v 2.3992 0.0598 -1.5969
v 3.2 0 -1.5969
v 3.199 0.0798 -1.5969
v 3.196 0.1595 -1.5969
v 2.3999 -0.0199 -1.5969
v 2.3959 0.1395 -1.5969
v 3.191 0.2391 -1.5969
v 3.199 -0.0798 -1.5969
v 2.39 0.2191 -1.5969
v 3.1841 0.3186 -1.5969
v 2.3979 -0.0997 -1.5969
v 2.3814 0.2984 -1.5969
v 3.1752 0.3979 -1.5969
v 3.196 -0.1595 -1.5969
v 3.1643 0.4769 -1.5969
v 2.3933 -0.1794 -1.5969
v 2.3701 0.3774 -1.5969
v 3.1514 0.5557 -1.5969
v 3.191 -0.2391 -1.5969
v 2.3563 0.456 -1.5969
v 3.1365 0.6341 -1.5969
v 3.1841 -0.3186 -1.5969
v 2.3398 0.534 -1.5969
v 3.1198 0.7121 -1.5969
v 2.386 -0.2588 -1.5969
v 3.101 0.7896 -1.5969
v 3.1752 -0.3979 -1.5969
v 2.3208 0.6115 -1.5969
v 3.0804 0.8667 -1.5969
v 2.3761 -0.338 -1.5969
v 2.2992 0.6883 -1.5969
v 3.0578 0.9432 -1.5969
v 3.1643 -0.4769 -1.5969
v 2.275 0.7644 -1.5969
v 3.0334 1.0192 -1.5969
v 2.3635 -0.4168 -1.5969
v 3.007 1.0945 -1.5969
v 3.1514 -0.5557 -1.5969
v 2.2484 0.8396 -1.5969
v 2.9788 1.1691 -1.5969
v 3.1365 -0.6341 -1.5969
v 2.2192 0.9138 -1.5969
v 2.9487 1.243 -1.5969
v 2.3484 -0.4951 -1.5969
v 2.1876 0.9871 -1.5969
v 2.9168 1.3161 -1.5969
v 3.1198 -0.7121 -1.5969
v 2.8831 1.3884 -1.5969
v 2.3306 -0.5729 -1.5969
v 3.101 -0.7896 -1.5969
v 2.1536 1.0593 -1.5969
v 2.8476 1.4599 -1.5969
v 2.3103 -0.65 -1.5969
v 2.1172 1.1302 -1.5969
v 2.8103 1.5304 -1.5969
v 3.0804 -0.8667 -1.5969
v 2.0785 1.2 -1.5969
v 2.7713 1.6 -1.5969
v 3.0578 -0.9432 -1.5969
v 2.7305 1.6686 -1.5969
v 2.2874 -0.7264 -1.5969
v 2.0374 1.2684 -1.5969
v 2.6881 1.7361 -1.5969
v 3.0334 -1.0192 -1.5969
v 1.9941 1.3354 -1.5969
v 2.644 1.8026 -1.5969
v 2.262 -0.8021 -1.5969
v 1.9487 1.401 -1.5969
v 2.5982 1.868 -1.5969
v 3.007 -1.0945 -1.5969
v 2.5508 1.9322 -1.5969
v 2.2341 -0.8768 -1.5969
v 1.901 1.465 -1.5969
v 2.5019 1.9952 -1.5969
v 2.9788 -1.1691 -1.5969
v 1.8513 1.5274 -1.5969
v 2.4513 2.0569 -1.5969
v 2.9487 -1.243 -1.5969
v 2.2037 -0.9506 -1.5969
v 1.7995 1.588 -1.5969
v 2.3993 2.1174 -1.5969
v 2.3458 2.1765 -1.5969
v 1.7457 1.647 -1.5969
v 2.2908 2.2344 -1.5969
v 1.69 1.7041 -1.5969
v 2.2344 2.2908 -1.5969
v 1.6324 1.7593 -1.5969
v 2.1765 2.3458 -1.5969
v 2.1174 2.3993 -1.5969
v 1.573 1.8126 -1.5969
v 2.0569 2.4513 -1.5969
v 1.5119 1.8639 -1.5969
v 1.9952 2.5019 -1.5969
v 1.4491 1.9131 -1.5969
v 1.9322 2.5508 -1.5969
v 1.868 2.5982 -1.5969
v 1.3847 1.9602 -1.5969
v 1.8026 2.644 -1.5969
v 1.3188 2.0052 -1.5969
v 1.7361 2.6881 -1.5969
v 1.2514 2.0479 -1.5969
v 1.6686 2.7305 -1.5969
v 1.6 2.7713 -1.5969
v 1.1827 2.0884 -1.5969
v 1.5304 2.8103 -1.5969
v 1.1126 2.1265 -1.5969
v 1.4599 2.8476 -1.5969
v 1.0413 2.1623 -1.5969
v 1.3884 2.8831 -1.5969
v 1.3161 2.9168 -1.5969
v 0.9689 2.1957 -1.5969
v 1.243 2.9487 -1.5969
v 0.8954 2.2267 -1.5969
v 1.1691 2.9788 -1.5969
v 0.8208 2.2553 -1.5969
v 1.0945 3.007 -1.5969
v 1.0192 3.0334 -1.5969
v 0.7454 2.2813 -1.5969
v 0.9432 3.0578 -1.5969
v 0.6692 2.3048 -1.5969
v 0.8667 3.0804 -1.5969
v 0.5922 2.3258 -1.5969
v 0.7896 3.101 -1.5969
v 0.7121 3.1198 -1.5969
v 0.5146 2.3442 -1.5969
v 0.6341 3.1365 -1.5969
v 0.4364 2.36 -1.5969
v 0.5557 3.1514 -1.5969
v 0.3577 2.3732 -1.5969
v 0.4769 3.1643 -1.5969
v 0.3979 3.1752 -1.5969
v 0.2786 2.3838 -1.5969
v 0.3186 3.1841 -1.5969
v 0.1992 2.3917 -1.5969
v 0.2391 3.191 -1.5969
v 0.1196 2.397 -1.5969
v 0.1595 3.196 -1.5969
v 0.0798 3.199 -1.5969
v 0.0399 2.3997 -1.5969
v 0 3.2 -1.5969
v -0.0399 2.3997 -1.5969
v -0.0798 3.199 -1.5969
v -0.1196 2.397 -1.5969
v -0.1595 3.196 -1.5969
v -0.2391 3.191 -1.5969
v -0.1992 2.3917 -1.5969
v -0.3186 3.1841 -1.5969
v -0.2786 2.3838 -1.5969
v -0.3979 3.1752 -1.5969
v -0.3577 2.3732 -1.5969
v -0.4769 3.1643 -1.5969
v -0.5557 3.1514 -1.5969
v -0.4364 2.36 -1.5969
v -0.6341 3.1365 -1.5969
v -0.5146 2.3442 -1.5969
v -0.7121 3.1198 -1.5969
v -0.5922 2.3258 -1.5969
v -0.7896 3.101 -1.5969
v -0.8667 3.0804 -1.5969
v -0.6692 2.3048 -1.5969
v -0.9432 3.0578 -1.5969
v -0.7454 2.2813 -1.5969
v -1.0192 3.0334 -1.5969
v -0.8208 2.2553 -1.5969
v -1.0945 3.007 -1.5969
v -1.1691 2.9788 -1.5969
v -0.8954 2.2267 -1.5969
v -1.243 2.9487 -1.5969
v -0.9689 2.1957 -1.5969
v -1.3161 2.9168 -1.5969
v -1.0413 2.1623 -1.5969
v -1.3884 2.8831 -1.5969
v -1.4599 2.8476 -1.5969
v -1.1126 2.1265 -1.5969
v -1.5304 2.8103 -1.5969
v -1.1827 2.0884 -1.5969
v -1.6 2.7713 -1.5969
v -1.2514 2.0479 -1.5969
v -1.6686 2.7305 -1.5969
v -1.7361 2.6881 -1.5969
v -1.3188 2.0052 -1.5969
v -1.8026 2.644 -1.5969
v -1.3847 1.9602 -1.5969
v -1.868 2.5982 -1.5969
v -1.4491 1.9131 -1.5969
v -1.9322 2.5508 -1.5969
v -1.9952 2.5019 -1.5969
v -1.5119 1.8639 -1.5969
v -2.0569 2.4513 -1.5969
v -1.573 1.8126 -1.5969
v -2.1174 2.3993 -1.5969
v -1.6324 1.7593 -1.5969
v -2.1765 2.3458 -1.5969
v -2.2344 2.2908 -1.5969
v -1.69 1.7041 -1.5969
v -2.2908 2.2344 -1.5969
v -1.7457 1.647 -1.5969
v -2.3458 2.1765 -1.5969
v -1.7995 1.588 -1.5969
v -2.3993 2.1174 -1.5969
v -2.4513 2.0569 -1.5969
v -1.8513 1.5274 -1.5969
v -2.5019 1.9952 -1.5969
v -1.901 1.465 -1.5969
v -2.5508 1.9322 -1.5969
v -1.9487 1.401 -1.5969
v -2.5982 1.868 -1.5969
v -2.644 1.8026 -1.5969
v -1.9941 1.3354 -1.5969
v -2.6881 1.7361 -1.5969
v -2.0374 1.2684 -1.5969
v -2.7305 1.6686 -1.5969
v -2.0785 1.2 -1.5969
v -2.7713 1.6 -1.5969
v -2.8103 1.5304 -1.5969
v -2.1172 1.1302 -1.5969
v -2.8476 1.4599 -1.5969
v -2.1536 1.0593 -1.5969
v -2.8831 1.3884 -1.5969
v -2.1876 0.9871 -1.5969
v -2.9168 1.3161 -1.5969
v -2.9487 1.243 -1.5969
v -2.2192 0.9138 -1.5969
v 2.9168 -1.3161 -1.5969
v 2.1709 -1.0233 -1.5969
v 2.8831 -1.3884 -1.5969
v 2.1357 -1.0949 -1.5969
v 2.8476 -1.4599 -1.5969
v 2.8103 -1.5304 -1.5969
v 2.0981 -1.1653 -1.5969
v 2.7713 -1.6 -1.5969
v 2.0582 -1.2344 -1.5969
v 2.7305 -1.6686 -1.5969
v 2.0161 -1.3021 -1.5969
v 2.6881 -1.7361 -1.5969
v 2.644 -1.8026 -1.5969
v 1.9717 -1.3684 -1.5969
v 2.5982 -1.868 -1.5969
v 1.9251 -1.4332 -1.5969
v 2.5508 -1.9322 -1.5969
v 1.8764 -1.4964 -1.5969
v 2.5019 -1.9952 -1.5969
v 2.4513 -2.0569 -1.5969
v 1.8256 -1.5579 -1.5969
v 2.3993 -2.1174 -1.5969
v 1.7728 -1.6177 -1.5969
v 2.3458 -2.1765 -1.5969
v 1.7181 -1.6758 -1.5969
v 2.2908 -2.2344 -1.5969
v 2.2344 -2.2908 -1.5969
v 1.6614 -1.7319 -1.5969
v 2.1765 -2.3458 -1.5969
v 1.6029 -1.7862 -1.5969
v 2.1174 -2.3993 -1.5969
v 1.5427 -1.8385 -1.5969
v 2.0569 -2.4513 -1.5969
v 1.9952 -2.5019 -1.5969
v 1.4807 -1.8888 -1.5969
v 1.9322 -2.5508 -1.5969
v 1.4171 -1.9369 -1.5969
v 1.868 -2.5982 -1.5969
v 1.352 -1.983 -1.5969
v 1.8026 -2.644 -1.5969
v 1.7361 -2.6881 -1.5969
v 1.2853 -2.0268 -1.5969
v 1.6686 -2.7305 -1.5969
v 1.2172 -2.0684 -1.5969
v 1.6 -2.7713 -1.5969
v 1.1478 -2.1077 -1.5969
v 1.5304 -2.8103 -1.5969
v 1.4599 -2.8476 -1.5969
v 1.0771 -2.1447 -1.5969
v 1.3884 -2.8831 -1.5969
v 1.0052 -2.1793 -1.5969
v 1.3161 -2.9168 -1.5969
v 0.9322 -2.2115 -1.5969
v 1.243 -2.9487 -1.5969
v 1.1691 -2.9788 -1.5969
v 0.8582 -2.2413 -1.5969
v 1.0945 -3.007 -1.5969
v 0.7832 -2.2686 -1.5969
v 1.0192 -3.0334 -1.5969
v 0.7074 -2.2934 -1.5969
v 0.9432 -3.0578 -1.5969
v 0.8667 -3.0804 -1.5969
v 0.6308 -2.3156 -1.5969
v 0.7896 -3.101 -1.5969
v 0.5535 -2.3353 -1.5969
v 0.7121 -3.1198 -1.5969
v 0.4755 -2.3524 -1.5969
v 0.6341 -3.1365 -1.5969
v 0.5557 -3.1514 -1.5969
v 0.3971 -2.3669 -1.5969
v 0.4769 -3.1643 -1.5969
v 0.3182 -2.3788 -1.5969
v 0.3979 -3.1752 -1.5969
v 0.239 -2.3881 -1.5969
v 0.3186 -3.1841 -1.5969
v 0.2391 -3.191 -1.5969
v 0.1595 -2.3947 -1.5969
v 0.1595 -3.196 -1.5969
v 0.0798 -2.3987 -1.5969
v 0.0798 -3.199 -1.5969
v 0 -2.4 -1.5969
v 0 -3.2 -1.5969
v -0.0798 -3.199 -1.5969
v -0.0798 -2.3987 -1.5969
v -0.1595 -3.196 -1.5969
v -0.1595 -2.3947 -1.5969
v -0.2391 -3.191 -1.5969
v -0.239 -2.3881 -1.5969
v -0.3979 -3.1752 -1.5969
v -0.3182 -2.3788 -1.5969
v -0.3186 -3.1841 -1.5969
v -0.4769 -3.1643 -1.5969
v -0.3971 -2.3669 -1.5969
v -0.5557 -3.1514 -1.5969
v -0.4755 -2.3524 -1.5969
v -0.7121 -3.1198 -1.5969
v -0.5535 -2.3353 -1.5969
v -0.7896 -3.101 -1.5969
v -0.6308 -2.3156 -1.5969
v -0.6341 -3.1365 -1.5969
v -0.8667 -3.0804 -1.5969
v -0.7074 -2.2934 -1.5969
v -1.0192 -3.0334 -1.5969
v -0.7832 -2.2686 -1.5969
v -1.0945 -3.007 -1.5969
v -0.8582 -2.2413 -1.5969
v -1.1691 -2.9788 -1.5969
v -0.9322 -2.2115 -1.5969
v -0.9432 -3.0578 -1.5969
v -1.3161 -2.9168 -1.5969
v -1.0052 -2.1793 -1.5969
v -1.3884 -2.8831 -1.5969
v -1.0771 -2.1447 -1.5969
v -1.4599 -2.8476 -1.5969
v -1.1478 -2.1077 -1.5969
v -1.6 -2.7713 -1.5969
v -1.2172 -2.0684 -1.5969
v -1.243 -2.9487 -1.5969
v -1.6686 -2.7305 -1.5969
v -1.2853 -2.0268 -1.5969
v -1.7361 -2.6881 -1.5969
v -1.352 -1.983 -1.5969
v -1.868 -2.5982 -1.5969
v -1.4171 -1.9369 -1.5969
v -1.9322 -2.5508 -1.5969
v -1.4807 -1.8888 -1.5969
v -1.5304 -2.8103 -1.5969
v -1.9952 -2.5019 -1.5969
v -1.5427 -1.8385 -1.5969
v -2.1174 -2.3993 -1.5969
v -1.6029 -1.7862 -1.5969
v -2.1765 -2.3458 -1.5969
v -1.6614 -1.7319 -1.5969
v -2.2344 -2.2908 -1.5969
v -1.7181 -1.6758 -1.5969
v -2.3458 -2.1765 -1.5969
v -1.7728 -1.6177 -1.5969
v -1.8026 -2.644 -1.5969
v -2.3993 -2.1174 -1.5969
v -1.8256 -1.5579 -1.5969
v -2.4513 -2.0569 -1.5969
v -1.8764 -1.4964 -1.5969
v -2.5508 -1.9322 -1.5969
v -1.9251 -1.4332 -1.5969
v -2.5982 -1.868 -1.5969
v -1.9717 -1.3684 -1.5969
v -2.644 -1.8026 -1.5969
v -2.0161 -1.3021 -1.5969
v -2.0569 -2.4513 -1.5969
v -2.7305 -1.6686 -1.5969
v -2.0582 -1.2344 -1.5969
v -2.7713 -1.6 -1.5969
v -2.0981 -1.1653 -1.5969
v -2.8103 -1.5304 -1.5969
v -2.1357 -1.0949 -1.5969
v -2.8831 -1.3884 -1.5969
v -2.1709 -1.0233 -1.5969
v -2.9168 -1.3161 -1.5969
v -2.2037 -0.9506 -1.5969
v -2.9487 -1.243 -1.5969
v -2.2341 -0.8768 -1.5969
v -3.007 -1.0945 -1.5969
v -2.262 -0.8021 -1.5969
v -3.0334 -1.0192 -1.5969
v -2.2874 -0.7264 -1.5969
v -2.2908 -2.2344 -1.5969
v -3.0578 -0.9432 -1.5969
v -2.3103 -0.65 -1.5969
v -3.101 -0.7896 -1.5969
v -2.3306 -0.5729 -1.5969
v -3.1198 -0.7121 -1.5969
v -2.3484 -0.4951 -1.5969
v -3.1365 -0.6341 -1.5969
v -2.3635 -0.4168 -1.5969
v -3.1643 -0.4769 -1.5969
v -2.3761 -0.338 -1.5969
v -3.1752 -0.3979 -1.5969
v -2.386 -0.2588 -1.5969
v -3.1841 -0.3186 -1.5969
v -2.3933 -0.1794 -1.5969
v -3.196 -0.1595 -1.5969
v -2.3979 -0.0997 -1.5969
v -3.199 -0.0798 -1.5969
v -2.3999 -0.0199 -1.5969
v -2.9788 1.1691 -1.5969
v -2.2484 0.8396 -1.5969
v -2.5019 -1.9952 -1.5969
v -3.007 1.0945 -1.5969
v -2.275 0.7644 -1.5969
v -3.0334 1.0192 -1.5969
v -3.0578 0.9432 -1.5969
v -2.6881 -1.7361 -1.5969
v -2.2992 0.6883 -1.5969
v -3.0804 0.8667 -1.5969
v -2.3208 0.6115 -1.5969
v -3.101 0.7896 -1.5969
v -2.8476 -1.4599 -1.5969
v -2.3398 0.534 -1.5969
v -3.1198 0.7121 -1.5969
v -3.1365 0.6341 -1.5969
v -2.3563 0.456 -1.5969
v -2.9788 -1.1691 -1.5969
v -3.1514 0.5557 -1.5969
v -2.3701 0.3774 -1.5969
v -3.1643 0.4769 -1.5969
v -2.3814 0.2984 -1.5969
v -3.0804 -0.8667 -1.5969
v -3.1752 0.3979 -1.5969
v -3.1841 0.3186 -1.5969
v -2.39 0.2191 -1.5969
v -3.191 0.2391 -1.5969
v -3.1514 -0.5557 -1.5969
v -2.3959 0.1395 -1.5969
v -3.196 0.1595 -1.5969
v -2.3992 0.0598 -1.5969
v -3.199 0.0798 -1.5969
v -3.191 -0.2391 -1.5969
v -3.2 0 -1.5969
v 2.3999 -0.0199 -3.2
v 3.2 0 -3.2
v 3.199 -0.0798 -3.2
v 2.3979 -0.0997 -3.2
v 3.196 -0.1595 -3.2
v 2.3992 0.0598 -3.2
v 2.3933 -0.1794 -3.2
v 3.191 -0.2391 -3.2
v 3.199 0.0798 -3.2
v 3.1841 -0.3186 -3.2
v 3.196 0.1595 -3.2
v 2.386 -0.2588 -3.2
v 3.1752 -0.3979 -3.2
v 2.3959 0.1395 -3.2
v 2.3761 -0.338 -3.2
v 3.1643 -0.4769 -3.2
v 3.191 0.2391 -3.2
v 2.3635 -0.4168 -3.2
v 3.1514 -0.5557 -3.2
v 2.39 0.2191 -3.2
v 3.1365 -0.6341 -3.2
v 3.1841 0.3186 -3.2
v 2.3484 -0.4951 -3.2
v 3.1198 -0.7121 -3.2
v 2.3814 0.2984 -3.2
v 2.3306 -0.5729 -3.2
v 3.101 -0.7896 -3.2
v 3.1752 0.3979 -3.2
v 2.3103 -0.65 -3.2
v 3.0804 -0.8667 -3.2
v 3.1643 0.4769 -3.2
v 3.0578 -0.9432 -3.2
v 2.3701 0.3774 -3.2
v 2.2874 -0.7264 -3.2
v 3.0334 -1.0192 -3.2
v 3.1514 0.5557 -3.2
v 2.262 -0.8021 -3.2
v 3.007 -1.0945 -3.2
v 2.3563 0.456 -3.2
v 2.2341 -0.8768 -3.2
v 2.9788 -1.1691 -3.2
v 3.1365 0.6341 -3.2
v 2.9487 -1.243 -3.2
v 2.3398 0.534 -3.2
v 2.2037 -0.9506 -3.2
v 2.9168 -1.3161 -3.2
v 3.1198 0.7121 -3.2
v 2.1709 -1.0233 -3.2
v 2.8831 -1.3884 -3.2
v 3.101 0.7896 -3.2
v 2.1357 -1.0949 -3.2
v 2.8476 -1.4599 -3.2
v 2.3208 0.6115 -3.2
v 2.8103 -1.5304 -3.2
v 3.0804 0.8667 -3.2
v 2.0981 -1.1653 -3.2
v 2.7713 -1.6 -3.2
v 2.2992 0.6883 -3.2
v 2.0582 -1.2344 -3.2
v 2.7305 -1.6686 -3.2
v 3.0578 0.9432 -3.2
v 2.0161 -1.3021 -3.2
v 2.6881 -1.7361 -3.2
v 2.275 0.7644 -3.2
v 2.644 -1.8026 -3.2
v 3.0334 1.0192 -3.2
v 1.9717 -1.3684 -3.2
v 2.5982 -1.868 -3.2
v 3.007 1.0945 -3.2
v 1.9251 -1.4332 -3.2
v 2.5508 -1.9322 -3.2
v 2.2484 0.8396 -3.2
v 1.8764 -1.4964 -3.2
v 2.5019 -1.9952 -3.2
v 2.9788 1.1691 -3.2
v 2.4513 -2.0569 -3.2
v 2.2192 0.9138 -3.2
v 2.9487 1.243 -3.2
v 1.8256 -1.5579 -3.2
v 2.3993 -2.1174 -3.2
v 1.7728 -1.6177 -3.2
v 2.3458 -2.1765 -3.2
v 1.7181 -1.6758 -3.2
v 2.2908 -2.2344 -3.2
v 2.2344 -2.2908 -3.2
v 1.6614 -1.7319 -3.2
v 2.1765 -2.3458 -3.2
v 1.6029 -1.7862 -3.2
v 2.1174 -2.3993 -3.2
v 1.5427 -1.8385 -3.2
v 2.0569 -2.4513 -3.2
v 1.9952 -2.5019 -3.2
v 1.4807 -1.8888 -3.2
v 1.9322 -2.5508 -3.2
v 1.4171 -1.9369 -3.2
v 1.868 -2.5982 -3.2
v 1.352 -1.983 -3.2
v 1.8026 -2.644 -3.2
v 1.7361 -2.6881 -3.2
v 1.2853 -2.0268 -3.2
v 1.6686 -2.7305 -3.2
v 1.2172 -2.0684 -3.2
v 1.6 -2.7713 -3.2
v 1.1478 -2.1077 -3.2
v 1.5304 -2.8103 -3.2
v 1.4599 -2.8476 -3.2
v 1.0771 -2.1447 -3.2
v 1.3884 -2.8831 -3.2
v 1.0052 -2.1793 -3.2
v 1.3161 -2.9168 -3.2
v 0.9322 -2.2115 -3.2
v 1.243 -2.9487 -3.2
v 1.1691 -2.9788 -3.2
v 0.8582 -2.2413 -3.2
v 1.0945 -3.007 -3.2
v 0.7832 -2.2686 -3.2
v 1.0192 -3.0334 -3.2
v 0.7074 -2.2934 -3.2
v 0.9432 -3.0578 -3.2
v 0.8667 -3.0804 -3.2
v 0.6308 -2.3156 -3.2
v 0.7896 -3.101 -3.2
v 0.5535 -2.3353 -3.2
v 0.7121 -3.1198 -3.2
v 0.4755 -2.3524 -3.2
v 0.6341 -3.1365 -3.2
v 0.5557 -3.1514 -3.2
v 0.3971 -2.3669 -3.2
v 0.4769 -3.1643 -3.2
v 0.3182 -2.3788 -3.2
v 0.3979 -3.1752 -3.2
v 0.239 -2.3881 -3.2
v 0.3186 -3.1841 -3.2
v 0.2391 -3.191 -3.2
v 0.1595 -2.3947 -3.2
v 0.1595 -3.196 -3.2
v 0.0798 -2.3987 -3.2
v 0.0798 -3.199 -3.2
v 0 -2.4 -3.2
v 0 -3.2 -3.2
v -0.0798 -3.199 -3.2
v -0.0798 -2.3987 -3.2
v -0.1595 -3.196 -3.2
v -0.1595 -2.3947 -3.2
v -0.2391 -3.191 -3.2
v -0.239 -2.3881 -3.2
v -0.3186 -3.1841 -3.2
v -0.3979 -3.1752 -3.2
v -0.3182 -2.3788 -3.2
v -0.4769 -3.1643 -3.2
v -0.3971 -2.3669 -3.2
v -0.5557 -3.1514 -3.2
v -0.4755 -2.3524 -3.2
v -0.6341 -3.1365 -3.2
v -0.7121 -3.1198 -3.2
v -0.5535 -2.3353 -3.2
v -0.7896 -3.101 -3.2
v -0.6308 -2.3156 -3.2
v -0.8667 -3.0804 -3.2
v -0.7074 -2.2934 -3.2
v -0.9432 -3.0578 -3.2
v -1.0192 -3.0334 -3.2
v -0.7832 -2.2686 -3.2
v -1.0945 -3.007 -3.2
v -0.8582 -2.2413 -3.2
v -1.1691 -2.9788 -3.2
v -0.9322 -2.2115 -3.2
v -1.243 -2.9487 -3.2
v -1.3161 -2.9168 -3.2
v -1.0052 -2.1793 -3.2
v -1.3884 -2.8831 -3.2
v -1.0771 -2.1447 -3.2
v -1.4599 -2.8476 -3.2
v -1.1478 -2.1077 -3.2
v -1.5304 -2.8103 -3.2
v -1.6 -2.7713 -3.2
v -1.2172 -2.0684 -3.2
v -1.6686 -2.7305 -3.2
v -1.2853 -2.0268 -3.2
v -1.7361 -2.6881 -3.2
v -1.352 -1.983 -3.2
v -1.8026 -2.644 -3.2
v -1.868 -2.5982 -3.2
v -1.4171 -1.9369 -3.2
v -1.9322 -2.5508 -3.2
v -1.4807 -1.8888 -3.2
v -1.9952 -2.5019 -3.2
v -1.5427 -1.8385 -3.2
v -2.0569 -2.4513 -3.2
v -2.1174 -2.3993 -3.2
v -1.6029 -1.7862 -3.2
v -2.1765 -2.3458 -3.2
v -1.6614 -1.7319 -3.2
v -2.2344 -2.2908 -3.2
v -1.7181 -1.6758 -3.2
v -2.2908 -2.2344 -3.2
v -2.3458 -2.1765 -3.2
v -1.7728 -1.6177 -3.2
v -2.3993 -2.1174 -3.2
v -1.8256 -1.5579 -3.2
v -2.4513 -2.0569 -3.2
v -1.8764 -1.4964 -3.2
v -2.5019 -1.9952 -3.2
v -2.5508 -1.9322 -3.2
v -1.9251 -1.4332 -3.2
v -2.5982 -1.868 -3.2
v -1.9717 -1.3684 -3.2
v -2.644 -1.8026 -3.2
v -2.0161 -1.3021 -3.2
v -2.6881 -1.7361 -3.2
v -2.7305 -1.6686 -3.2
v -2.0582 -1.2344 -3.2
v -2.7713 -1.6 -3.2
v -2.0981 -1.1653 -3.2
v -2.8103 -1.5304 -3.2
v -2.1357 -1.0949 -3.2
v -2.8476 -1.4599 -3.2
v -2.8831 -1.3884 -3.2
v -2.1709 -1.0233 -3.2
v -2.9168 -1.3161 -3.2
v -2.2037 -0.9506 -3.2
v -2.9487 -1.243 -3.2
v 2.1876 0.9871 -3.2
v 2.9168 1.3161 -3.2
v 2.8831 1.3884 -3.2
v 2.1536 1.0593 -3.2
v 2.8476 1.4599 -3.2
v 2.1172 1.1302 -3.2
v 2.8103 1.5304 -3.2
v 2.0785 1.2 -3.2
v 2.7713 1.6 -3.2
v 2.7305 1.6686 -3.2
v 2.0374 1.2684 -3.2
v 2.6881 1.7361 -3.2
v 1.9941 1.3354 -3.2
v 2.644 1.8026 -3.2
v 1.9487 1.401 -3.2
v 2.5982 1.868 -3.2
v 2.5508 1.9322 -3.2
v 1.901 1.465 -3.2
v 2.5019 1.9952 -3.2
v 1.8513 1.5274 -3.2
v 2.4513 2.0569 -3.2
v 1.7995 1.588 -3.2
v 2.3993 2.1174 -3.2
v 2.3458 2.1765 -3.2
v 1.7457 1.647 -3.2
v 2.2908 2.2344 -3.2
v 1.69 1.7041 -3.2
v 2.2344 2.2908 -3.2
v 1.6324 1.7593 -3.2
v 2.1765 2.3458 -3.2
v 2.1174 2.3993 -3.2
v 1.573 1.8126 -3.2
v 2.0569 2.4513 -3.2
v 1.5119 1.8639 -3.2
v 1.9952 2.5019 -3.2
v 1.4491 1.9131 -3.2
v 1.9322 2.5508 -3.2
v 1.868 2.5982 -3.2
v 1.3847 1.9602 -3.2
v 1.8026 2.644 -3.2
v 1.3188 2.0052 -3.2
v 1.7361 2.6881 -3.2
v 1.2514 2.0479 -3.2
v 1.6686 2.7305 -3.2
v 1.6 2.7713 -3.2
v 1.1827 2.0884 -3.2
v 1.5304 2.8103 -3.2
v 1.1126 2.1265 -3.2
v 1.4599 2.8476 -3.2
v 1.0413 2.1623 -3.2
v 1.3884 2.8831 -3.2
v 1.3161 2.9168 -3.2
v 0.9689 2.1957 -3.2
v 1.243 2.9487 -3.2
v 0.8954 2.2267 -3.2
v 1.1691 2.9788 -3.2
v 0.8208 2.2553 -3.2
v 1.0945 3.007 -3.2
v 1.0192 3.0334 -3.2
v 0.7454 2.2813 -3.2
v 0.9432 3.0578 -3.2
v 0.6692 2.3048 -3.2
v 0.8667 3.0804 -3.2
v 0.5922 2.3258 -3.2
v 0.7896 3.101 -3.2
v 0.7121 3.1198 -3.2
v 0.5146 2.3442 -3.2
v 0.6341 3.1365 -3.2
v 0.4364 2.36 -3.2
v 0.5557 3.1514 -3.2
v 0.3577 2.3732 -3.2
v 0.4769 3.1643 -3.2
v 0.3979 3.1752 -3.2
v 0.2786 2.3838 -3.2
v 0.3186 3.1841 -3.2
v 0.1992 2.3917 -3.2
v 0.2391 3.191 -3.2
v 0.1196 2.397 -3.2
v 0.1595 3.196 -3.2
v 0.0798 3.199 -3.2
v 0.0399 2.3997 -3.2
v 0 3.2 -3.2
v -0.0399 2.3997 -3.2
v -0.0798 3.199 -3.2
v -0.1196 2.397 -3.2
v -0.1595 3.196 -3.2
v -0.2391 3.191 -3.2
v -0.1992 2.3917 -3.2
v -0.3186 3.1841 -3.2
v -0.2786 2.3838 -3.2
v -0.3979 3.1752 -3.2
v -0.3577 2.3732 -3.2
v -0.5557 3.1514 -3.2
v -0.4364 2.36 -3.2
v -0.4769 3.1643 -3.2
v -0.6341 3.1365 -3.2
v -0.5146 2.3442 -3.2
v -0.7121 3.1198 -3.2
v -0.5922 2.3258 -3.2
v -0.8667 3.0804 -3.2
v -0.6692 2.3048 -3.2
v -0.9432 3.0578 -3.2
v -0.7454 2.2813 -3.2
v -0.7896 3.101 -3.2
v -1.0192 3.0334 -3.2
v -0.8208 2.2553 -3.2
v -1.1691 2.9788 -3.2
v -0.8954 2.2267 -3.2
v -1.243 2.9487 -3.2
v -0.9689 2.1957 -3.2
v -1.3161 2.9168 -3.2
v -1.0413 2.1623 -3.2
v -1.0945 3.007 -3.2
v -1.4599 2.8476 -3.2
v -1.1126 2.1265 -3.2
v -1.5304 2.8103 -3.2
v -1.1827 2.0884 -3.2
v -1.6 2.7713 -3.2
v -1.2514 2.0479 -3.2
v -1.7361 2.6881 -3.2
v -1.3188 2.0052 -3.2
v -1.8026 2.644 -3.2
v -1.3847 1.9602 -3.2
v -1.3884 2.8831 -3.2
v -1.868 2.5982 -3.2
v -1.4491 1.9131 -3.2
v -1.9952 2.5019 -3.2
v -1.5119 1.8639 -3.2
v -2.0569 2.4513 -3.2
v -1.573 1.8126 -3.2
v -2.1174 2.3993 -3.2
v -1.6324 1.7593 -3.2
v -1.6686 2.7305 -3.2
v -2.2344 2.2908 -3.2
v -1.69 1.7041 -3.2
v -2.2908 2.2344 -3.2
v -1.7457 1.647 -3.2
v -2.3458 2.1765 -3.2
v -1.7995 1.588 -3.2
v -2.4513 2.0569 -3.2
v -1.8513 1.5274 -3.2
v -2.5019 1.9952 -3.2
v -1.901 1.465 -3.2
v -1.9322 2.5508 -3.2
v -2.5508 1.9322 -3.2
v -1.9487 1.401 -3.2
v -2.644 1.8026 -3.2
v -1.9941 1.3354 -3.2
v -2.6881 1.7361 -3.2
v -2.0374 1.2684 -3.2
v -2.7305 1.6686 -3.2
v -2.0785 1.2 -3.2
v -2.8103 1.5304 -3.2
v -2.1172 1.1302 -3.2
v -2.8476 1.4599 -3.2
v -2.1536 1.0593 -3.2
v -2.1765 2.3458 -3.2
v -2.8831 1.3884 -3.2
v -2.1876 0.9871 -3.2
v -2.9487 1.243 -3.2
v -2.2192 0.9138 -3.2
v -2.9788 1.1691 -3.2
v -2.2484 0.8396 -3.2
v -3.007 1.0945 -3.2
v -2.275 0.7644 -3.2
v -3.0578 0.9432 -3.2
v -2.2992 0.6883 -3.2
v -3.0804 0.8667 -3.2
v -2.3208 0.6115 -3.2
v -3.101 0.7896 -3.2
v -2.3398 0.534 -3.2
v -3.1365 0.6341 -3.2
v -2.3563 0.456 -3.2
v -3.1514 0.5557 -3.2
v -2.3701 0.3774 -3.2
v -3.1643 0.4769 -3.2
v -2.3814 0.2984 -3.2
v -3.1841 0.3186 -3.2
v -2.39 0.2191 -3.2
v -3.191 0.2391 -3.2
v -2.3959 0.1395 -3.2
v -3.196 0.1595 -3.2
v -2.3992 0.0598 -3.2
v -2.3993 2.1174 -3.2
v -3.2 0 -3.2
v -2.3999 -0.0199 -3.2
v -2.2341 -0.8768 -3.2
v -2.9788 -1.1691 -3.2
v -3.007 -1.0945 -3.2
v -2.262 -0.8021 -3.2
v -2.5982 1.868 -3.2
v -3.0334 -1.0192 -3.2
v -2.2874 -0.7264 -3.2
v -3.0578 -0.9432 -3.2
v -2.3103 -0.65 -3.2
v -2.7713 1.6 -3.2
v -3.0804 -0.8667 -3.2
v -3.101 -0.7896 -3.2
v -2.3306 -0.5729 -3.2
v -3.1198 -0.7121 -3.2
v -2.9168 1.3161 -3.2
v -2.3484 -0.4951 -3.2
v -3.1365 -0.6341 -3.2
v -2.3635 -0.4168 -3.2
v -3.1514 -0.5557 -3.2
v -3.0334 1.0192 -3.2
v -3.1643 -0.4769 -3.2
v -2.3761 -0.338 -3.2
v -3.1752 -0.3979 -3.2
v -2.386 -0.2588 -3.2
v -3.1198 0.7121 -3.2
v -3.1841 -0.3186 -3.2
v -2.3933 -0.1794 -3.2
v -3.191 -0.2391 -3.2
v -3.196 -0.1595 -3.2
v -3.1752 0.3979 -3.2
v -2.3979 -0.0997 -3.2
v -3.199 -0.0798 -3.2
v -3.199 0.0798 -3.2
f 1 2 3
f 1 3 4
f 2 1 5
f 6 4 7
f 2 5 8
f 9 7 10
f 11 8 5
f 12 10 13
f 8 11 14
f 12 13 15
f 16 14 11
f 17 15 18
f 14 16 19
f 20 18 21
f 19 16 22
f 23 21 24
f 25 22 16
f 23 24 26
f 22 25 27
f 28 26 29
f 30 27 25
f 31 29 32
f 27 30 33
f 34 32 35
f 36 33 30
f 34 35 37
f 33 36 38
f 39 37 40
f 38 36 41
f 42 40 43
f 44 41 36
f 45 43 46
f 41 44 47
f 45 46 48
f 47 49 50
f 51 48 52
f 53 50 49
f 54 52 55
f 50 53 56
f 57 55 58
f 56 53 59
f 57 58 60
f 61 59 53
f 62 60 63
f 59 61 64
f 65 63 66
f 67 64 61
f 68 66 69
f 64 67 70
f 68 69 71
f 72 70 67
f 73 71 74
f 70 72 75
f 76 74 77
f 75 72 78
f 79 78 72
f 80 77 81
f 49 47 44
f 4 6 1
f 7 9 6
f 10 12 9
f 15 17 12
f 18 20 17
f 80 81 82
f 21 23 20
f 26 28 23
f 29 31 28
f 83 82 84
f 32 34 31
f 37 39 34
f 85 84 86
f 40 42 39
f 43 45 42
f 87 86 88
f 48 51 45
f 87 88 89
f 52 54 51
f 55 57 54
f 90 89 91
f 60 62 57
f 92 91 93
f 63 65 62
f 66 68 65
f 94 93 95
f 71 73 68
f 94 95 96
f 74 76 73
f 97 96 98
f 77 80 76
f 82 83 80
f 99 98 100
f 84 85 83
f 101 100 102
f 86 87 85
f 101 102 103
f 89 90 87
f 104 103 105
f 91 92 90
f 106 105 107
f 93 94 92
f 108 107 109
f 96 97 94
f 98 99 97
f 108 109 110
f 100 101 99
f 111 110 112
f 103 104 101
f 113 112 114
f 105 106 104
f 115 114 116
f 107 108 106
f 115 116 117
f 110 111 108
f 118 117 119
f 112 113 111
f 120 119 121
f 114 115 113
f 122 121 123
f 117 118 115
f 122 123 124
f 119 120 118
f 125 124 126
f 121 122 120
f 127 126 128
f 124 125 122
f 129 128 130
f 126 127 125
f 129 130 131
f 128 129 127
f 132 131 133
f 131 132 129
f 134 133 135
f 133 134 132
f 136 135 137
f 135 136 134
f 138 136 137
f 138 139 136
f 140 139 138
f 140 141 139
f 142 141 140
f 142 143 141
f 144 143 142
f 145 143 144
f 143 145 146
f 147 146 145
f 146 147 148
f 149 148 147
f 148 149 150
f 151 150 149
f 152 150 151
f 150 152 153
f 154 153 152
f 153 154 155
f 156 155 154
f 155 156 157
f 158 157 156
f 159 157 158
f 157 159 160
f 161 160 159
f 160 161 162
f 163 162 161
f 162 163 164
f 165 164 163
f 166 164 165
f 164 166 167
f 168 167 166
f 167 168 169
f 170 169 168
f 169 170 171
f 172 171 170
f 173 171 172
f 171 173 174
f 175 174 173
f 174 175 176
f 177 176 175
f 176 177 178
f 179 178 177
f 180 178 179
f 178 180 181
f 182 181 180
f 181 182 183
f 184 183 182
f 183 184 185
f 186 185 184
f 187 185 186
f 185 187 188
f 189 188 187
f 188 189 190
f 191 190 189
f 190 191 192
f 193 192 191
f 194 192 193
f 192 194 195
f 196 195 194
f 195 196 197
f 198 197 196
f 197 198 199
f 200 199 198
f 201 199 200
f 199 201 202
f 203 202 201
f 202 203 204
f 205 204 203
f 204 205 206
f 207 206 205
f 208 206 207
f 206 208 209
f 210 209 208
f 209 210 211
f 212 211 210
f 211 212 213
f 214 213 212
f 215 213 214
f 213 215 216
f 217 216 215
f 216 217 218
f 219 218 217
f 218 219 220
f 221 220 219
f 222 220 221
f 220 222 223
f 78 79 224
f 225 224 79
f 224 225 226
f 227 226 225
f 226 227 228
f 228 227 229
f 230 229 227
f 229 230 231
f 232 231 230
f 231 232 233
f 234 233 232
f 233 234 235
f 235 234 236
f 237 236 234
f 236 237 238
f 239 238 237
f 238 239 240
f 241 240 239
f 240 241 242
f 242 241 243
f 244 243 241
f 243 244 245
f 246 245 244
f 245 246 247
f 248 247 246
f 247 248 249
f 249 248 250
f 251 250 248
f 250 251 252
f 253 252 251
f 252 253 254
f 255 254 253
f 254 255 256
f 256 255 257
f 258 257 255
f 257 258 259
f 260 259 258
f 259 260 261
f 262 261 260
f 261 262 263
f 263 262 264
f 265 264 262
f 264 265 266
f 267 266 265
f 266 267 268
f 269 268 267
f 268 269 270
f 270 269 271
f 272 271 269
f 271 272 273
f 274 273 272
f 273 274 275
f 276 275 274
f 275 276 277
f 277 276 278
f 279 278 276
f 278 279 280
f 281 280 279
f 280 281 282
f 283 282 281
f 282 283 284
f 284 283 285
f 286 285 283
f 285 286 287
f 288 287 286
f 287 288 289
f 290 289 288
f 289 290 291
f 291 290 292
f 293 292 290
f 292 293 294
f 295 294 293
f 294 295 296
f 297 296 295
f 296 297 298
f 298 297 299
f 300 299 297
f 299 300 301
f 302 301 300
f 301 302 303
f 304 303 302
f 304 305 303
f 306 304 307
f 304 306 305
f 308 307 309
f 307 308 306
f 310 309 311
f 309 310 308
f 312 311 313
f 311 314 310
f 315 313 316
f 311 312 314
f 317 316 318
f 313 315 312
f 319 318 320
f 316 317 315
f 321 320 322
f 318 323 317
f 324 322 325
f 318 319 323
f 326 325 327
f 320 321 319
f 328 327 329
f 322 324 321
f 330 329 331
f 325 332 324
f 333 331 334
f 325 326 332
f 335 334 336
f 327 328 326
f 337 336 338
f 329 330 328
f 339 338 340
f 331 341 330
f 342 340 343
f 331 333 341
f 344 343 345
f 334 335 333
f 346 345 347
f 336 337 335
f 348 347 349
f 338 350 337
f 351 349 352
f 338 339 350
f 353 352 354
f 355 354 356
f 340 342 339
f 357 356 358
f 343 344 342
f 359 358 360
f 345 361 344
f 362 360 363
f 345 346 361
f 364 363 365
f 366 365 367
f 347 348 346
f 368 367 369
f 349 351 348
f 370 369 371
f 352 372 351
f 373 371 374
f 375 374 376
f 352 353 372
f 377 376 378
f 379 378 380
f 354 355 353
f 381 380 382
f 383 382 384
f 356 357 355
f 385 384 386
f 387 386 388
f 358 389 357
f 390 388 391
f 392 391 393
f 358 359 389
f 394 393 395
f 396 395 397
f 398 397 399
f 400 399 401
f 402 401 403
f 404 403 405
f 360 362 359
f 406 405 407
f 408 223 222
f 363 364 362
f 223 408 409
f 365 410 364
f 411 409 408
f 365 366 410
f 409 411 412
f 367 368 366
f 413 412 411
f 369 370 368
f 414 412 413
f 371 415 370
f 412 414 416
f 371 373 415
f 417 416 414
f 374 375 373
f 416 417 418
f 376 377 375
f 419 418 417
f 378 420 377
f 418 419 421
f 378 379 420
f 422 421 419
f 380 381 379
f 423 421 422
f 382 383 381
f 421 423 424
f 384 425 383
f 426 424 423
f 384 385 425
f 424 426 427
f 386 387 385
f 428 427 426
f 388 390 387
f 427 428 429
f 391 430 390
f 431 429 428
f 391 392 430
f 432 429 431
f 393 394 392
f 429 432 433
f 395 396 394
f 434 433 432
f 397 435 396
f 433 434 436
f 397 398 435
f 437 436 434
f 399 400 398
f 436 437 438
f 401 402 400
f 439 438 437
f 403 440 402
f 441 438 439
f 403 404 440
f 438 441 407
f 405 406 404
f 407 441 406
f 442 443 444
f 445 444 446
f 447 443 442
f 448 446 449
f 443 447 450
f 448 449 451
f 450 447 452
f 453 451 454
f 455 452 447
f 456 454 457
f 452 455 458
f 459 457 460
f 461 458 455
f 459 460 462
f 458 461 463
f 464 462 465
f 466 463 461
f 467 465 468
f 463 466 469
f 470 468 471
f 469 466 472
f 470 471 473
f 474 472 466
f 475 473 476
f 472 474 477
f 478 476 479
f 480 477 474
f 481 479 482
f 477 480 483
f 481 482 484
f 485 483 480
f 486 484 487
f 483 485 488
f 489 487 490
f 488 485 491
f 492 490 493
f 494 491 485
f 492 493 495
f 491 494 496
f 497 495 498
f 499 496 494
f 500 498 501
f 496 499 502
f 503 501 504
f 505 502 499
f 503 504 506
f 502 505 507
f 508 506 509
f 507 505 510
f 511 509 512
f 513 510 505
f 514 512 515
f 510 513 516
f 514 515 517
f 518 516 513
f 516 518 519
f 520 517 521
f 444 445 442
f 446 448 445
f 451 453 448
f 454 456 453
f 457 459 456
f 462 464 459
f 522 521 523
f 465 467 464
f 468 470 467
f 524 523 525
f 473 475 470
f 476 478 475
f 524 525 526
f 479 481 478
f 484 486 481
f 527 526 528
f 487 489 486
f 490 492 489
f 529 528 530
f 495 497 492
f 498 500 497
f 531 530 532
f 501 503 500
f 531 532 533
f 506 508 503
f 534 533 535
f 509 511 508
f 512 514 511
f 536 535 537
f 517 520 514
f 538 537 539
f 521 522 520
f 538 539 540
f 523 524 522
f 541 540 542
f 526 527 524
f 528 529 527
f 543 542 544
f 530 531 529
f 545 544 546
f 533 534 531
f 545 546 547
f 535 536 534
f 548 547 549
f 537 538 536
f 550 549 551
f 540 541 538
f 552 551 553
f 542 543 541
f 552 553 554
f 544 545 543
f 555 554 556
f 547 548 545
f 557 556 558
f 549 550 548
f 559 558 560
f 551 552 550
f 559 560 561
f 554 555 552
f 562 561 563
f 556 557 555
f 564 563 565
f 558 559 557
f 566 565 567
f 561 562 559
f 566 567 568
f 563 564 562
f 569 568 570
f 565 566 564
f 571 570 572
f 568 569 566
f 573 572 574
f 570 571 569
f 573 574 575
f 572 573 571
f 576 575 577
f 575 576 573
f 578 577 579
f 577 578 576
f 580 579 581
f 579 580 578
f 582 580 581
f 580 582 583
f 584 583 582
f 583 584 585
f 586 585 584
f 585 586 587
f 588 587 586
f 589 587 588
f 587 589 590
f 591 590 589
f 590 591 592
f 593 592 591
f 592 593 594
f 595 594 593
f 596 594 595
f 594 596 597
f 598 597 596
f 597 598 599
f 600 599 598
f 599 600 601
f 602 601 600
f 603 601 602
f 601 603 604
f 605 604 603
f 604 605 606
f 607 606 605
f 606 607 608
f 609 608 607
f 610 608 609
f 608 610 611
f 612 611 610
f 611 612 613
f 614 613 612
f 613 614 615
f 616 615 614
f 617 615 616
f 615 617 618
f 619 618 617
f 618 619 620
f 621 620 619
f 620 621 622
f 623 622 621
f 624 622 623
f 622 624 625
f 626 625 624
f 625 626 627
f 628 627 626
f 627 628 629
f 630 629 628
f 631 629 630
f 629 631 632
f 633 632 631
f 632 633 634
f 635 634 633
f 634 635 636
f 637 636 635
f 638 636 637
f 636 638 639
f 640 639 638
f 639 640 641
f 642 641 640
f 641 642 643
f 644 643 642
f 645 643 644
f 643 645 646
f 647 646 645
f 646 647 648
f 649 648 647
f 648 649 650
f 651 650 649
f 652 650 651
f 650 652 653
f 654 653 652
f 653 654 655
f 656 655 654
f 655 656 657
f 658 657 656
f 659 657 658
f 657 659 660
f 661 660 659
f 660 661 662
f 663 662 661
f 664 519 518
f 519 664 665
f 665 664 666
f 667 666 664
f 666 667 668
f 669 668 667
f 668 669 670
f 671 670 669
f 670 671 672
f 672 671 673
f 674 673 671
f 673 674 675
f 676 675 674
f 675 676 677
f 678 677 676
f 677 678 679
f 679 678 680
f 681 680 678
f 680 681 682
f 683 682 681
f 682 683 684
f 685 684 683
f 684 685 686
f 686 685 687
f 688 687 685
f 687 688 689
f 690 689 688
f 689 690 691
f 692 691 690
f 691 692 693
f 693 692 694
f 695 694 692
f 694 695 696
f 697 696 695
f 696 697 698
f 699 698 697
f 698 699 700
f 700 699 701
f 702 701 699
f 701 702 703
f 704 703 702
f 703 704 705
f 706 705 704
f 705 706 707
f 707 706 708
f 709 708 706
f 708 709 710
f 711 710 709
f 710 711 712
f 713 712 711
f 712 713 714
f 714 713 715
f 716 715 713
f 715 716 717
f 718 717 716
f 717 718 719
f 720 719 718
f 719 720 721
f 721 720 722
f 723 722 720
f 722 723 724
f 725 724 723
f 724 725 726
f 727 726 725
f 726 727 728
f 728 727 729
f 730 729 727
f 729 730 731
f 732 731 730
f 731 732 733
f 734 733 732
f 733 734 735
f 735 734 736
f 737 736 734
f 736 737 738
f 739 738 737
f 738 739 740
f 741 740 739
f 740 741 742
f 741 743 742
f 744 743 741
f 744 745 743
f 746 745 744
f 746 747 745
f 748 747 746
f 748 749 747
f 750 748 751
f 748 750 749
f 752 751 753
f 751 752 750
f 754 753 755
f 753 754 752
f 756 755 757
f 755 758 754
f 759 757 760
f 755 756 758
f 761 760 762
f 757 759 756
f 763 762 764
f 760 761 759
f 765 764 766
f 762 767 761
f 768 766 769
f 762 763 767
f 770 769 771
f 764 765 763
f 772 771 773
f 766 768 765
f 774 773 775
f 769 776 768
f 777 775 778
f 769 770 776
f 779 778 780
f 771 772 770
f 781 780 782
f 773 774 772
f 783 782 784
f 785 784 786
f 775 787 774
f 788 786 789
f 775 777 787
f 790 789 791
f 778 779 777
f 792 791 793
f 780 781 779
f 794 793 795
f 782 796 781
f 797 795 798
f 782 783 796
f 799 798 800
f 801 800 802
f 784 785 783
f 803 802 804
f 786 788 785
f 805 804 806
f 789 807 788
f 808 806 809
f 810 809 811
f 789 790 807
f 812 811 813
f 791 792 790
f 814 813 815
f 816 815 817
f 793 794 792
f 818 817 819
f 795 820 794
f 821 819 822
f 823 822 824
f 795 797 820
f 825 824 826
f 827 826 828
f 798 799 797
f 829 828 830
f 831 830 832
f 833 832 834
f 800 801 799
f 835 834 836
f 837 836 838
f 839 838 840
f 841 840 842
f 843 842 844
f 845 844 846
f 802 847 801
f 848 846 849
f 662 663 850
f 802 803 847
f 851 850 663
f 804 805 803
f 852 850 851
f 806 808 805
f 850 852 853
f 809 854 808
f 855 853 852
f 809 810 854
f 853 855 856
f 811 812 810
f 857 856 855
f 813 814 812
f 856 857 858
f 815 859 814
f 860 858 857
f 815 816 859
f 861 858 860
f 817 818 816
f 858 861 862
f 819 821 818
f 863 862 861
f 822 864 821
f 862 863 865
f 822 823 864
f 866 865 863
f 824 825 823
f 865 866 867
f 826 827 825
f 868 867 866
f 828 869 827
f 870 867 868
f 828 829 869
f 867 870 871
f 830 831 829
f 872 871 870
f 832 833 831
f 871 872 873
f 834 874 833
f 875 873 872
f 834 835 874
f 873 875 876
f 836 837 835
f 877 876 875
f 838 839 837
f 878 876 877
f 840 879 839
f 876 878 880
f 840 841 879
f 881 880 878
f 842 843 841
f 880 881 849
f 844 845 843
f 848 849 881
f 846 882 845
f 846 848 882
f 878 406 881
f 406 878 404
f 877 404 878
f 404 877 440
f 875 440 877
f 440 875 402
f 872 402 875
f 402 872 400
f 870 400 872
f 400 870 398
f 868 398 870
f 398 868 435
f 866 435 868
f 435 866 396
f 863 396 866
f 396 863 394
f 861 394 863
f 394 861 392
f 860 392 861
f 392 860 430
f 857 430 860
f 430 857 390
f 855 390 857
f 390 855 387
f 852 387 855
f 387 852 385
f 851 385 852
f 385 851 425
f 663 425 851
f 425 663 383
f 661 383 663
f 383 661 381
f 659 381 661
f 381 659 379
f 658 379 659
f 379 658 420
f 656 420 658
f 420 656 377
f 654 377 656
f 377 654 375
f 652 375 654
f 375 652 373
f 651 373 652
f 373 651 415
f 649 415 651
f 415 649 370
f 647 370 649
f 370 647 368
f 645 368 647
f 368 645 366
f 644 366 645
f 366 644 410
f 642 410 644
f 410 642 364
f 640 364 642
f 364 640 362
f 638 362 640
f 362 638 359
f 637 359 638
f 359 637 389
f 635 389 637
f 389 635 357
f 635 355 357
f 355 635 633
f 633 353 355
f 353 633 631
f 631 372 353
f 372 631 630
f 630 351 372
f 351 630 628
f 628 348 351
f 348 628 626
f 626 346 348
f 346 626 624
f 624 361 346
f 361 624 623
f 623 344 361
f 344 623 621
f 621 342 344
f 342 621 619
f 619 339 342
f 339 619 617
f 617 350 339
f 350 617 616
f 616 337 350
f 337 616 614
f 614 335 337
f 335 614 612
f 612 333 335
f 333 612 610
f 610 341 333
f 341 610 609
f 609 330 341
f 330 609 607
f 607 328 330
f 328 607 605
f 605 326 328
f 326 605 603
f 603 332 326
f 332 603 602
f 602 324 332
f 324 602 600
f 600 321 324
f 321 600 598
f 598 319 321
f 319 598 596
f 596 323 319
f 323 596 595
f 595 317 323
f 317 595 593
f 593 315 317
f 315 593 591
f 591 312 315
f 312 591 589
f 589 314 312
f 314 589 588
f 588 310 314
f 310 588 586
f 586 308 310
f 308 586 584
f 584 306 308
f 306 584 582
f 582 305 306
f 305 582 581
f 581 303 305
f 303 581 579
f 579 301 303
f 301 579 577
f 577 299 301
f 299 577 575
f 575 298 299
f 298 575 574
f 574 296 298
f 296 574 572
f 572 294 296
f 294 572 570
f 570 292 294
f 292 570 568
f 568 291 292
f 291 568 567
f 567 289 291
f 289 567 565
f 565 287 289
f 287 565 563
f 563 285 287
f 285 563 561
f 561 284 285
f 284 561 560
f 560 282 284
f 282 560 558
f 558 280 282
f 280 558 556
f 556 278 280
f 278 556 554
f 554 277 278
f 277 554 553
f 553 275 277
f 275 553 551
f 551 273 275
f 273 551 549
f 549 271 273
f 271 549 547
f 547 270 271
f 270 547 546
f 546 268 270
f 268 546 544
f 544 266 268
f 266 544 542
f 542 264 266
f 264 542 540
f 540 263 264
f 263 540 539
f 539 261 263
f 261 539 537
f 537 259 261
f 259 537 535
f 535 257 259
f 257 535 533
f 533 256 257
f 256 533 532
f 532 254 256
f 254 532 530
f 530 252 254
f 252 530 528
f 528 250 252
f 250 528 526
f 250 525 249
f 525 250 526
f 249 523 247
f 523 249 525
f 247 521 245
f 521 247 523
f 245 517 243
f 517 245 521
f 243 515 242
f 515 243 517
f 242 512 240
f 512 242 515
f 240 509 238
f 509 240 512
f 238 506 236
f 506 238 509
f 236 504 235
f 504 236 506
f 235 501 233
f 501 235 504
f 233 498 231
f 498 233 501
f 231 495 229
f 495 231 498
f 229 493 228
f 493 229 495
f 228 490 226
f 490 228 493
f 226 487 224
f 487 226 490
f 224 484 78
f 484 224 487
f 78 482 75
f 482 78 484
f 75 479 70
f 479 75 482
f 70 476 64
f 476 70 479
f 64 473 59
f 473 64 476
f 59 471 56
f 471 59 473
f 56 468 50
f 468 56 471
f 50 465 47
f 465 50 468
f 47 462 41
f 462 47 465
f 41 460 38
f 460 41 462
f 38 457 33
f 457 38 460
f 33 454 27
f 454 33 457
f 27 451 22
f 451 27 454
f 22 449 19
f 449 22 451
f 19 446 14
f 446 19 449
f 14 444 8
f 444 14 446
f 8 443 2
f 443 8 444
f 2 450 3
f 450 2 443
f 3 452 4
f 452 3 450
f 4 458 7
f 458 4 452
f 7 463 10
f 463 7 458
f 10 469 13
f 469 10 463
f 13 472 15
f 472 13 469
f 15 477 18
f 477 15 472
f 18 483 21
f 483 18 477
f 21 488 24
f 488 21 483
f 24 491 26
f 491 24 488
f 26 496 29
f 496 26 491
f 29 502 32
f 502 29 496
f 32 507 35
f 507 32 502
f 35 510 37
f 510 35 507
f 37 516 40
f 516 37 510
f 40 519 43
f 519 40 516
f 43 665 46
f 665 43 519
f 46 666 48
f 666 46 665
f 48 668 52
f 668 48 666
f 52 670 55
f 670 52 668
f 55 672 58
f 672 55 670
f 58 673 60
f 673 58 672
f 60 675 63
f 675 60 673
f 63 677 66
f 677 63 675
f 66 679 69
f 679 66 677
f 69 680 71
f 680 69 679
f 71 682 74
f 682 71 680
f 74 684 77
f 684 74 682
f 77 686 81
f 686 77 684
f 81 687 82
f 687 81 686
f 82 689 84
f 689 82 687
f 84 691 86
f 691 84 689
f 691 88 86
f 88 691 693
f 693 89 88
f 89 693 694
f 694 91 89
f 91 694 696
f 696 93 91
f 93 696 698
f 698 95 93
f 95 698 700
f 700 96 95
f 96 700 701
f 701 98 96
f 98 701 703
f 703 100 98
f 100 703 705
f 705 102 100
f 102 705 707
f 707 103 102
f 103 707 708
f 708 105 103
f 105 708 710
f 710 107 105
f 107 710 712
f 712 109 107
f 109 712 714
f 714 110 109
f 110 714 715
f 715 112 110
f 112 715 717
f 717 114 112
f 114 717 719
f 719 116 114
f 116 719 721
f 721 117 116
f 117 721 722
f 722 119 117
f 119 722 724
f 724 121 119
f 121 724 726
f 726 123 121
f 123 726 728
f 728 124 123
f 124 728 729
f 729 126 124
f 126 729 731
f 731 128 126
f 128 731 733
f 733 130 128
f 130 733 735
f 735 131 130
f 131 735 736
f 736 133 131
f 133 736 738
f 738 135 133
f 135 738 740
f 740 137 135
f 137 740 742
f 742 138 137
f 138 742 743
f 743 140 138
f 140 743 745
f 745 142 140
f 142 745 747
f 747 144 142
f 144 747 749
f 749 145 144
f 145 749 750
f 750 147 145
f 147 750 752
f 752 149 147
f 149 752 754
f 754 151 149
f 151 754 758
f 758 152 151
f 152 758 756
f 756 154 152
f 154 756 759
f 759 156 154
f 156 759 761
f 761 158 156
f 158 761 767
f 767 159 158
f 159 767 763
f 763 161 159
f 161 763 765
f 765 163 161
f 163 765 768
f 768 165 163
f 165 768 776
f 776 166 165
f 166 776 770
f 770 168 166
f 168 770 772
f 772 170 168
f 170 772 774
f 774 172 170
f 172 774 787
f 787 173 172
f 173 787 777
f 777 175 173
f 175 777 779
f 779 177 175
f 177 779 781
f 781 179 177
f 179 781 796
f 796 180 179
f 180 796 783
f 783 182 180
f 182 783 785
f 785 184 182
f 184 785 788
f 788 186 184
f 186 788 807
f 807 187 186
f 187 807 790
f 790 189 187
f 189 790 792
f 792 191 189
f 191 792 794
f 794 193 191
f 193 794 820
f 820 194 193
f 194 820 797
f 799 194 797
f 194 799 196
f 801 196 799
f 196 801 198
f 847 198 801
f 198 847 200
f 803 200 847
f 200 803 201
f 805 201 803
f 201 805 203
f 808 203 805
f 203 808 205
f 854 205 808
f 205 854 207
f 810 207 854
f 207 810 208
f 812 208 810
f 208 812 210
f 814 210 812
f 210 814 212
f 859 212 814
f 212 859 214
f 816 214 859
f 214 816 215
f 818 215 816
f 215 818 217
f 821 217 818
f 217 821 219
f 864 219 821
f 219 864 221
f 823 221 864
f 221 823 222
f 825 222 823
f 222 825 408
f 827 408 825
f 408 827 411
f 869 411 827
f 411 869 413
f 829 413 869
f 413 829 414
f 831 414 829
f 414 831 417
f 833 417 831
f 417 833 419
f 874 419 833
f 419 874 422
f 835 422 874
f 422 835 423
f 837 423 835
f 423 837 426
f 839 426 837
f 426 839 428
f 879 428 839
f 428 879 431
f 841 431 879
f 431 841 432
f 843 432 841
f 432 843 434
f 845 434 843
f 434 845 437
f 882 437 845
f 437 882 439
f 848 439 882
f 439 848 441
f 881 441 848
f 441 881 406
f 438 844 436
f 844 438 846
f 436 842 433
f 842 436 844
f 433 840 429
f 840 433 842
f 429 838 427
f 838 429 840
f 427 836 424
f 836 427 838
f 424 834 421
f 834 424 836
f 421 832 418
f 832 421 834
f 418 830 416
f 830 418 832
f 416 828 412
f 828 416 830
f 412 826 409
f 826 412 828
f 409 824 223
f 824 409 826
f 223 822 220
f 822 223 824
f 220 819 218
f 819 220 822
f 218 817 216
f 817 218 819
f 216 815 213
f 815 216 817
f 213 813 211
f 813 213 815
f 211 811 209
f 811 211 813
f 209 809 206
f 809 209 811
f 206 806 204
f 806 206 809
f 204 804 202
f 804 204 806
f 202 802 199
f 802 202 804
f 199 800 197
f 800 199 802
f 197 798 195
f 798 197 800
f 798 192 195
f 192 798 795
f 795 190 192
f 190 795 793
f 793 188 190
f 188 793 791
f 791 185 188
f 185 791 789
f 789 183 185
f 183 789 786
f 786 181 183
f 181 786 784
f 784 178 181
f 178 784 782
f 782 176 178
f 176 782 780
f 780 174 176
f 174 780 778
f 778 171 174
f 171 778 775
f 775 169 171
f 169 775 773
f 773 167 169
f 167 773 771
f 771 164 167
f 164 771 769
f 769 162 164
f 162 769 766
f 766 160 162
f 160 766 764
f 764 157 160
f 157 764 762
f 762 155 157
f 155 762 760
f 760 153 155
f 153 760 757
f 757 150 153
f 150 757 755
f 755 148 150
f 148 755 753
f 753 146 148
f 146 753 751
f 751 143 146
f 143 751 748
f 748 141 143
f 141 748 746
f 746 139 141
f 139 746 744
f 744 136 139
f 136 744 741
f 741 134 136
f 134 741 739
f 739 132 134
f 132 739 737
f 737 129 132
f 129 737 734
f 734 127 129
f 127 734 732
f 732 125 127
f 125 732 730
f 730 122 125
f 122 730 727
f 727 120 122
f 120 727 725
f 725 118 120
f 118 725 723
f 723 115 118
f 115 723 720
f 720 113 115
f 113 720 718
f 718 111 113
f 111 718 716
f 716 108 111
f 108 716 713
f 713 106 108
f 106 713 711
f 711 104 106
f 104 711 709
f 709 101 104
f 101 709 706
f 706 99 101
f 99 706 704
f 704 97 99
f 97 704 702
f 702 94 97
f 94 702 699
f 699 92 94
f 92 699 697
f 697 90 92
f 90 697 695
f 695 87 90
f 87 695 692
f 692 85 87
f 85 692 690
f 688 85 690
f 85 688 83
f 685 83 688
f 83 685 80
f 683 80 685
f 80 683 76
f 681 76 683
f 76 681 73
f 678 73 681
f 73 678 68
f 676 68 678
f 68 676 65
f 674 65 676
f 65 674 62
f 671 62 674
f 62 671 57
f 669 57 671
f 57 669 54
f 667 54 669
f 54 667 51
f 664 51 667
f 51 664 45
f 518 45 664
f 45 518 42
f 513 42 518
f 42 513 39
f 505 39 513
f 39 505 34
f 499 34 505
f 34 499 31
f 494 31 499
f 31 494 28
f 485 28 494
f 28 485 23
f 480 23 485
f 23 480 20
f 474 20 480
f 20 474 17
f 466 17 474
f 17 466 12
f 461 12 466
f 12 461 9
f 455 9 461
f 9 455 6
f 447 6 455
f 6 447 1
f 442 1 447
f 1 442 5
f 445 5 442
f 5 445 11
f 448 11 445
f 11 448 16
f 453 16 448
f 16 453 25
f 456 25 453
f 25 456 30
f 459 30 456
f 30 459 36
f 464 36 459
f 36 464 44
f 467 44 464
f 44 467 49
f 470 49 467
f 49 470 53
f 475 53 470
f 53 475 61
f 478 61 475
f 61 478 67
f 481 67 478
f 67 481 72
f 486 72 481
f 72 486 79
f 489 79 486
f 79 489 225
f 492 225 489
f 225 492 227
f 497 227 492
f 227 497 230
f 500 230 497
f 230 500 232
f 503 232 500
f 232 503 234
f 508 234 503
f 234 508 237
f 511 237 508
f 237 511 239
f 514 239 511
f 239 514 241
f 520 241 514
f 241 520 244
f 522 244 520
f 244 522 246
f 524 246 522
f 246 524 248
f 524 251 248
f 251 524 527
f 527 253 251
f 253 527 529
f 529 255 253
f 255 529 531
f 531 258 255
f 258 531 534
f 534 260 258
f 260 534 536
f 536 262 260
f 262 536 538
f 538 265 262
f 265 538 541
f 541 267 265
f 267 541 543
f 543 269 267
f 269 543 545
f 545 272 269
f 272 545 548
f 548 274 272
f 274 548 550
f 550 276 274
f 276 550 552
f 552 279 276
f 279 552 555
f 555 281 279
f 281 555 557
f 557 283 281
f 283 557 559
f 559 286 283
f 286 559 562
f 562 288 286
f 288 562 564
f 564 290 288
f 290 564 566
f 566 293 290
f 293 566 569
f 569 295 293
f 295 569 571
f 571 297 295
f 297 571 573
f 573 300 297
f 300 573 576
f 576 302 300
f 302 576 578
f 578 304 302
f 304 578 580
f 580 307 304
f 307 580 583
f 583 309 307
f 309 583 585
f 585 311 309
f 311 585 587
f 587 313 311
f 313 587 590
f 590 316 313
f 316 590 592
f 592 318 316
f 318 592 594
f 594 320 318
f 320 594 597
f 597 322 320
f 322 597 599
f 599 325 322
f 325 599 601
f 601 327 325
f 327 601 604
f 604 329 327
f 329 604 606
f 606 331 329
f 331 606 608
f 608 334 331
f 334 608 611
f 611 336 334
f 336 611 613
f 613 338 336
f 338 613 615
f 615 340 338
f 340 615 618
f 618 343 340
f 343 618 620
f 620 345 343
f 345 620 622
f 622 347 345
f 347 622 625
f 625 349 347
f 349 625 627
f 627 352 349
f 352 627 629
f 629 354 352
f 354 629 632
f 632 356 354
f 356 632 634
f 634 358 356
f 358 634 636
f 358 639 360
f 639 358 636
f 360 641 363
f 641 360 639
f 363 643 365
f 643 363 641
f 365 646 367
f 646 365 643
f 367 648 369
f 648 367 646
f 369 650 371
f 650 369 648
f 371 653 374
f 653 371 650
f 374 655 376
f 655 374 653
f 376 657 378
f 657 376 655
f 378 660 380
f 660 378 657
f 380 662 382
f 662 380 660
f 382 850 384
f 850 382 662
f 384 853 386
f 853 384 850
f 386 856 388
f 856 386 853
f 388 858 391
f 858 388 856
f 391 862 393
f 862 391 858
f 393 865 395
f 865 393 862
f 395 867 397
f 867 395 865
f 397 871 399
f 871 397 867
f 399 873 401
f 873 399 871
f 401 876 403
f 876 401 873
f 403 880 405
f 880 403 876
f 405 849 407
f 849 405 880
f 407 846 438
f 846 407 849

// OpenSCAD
use <../lib.scad>
use <3068bp22.scad>
$fa=1; $fs=0.2;
function ldraw_lib__3068p22(realsolid=false) = [
// 0 ~Moved to 3068bp22
// 0 Name: 3068p22.dat
// 0 Author: [PTadmin]
// 0 !LDRAW_ORG Part UPDATE 2002-04
// 0 !LICENSE Licensed under CC BY 4.0 : see CAreadme.txt
// 
// 0 BFC CERTIFY CCW
  [0,"BFC","CERTIFY"],
  [0,"BFC","CCW"],
// 
// 0 !HISTORY 1997-09-29 [PTadmin] Official Update 1997-15
// 0 !HISTORY 2002-08-18 [PTadmin] Official Update 2002-04
// 0 !HISTORY 2007-06-13 [PTadmin] Header formatted for Contributor Agreement
// 0 !HISTORY 2008-07-01 [PTadmin] Official Update 2008-01
// 
// 
// 1 16 0 0 0 1 0 0 0 1 0 0 0 1 3068bp22.dat
  [1,16,0,0,0,1,0,0,0,1,0,0,0,1, ldraw_lib__3068bp22(realsolid)],
];
module ldraw_lib__3068p22(step=0, col=false, unit=2/5, alt=false, line=0.2, solid=!$preview)
    makepoly(ldraw_lib__3068p22(solid), step=step, col=col, unit=unit, alt=alt, line=line, solid=solid);
ldraw_lib__3068p22(line=0.2);
